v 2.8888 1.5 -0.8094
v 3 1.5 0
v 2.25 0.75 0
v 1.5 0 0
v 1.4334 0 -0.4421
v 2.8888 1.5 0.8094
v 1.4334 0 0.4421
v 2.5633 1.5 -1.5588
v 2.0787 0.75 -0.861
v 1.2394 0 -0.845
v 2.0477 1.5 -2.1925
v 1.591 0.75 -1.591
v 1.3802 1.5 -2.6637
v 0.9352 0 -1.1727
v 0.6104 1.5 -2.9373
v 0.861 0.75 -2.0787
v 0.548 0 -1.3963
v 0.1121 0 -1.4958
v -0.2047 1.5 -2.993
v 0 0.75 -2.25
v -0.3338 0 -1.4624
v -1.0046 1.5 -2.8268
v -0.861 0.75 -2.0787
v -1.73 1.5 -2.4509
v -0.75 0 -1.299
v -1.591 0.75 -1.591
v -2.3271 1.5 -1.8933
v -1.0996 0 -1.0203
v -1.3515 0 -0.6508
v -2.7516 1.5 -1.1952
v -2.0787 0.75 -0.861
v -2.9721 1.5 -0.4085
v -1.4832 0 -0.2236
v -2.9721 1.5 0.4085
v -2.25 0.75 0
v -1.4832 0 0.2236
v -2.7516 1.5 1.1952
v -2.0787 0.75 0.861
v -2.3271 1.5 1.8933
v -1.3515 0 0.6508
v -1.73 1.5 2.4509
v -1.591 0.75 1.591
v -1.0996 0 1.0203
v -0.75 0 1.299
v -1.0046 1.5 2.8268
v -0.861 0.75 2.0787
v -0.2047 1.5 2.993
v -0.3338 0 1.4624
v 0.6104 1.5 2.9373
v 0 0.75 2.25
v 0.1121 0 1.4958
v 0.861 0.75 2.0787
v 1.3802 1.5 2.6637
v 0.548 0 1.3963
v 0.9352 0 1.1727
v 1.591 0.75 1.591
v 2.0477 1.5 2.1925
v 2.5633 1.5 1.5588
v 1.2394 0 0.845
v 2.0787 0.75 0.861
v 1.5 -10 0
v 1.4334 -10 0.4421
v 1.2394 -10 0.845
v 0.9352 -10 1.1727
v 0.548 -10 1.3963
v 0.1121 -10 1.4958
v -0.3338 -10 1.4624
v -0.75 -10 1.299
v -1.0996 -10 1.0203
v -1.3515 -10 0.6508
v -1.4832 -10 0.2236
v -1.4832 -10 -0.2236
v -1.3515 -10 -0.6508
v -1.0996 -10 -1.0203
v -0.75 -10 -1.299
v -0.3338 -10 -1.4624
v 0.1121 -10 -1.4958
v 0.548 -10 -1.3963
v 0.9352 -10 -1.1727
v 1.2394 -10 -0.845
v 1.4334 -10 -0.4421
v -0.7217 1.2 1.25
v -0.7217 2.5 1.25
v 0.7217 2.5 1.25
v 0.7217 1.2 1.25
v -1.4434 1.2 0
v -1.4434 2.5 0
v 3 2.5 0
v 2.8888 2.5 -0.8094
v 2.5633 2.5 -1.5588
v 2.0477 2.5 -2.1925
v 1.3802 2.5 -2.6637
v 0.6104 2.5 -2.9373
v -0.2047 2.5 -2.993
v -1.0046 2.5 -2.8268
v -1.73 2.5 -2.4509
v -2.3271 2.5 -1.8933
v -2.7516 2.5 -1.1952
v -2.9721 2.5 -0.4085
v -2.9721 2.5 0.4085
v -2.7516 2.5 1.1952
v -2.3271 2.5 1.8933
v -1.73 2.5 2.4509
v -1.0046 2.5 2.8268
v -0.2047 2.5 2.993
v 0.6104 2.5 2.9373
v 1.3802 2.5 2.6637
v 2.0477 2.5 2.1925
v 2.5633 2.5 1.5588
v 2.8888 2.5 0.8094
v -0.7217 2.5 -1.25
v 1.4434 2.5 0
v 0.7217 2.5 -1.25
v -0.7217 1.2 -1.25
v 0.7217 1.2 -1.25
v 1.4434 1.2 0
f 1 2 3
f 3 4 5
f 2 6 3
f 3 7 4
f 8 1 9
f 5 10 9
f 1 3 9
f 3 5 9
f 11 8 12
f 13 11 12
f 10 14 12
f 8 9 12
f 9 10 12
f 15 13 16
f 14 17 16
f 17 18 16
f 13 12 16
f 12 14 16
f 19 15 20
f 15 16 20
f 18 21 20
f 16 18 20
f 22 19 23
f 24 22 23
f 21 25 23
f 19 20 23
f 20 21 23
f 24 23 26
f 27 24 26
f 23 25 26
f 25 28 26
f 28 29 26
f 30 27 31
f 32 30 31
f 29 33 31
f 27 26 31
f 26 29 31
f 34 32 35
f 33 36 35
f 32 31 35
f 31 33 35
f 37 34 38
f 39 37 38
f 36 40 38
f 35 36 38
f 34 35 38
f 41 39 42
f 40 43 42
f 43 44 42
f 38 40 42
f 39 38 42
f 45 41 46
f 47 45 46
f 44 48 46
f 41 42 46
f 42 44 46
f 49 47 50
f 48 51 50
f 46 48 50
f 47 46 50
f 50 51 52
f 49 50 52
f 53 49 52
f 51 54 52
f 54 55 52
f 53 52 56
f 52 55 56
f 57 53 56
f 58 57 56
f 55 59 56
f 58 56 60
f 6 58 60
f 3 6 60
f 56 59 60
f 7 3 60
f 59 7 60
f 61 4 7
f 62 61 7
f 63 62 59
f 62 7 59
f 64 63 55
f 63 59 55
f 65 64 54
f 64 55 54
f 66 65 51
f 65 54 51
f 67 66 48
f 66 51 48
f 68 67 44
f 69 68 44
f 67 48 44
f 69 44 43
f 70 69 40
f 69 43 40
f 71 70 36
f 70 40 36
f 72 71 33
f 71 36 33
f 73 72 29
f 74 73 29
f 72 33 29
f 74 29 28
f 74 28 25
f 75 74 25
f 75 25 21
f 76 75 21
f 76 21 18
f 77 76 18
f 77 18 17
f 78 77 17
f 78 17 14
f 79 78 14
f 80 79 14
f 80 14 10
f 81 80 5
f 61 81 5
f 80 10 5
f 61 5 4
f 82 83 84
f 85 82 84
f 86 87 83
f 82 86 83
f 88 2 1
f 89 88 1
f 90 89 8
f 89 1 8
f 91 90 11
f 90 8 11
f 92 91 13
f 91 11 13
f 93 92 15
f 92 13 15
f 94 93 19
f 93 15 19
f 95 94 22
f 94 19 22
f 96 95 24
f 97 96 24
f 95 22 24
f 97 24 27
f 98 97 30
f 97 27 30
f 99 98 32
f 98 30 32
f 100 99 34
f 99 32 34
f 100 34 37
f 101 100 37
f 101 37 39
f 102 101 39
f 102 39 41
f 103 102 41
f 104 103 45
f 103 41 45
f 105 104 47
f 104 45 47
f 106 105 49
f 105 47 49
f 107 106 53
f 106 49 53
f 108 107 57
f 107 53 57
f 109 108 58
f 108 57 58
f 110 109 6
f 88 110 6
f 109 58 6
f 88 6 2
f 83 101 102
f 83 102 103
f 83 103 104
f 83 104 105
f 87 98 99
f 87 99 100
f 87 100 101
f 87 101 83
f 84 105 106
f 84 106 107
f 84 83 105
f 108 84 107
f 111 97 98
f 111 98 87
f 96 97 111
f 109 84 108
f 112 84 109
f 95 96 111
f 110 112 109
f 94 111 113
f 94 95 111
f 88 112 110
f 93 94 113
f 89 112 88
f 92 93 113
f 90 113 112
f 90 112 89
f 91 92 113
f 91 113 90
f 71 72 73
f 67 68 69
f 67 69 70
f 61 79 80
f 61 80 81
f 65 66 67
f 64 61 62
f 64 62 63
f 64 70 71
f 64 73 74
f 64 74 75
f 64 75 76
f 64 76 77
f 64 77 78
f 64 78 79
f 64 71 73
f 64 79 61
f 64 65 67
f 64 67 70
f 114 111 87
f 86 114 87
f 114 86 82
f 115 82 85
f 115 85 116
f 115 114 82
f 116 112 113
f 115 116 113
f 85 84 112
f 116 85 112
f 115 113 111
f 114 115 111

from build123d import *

# Parameters (mm, degrees)
SKETCH_1_R            = 3
EXTRUDE_251_DEPTH     = 2.5
CHAMFER_1_SIZE        = 1.5
CUT_EXTRUDE_459_DEPTH = 1.3
SKETCH_3_R            = 1.5
EXTRUDE_571_DEPTH     = 10


with BuildPart() as part:
    # 草图1 → Extrude 251 (new body)
    with BuildSketch(Plane(origin=(0, 0, 0), x_dir=(1, 0, 0), z_dir=(0, 1, 0))):
        Circle(SKETCH_1_R)
    extrude(amount=EXTRUDE_251_DEPTH)

    # 倒角1
    chamfer_1_edges = [part.edges().sort_by_distance(p)[0] for p in [
        (-3, 0, 0),
    ]]
    chamfer(chamfer_1_edges, length=CHAMFER_1_SIZE)

    # 草图2 → Cut-Extrude 459 (cut)
    with BuildSketch(Plane(origin=(0, 2.5, 0), x_dir=(1, 0, 0), z_dir=(0, 1, 0))):
        Polygon((1.443375673, 0), (0.721687836, 1.25), (-0.721687836, 1.25), (-1.443375673, 0), (-0.721687836, -1.25), (0.721687836, -1.25), align=None)
    extrude(amount=-CUT_EXTRUDE_459_DEPTH, mode=Mode.SUBTRACT)

    # 草图3 → Extrude 571 (add)
    with BuildSketch(Plane.XZ):
        Circle(SKETCH_3_R)
    extrude(amount=EXTRUDE_571_DEPTH)


solid = part.part
